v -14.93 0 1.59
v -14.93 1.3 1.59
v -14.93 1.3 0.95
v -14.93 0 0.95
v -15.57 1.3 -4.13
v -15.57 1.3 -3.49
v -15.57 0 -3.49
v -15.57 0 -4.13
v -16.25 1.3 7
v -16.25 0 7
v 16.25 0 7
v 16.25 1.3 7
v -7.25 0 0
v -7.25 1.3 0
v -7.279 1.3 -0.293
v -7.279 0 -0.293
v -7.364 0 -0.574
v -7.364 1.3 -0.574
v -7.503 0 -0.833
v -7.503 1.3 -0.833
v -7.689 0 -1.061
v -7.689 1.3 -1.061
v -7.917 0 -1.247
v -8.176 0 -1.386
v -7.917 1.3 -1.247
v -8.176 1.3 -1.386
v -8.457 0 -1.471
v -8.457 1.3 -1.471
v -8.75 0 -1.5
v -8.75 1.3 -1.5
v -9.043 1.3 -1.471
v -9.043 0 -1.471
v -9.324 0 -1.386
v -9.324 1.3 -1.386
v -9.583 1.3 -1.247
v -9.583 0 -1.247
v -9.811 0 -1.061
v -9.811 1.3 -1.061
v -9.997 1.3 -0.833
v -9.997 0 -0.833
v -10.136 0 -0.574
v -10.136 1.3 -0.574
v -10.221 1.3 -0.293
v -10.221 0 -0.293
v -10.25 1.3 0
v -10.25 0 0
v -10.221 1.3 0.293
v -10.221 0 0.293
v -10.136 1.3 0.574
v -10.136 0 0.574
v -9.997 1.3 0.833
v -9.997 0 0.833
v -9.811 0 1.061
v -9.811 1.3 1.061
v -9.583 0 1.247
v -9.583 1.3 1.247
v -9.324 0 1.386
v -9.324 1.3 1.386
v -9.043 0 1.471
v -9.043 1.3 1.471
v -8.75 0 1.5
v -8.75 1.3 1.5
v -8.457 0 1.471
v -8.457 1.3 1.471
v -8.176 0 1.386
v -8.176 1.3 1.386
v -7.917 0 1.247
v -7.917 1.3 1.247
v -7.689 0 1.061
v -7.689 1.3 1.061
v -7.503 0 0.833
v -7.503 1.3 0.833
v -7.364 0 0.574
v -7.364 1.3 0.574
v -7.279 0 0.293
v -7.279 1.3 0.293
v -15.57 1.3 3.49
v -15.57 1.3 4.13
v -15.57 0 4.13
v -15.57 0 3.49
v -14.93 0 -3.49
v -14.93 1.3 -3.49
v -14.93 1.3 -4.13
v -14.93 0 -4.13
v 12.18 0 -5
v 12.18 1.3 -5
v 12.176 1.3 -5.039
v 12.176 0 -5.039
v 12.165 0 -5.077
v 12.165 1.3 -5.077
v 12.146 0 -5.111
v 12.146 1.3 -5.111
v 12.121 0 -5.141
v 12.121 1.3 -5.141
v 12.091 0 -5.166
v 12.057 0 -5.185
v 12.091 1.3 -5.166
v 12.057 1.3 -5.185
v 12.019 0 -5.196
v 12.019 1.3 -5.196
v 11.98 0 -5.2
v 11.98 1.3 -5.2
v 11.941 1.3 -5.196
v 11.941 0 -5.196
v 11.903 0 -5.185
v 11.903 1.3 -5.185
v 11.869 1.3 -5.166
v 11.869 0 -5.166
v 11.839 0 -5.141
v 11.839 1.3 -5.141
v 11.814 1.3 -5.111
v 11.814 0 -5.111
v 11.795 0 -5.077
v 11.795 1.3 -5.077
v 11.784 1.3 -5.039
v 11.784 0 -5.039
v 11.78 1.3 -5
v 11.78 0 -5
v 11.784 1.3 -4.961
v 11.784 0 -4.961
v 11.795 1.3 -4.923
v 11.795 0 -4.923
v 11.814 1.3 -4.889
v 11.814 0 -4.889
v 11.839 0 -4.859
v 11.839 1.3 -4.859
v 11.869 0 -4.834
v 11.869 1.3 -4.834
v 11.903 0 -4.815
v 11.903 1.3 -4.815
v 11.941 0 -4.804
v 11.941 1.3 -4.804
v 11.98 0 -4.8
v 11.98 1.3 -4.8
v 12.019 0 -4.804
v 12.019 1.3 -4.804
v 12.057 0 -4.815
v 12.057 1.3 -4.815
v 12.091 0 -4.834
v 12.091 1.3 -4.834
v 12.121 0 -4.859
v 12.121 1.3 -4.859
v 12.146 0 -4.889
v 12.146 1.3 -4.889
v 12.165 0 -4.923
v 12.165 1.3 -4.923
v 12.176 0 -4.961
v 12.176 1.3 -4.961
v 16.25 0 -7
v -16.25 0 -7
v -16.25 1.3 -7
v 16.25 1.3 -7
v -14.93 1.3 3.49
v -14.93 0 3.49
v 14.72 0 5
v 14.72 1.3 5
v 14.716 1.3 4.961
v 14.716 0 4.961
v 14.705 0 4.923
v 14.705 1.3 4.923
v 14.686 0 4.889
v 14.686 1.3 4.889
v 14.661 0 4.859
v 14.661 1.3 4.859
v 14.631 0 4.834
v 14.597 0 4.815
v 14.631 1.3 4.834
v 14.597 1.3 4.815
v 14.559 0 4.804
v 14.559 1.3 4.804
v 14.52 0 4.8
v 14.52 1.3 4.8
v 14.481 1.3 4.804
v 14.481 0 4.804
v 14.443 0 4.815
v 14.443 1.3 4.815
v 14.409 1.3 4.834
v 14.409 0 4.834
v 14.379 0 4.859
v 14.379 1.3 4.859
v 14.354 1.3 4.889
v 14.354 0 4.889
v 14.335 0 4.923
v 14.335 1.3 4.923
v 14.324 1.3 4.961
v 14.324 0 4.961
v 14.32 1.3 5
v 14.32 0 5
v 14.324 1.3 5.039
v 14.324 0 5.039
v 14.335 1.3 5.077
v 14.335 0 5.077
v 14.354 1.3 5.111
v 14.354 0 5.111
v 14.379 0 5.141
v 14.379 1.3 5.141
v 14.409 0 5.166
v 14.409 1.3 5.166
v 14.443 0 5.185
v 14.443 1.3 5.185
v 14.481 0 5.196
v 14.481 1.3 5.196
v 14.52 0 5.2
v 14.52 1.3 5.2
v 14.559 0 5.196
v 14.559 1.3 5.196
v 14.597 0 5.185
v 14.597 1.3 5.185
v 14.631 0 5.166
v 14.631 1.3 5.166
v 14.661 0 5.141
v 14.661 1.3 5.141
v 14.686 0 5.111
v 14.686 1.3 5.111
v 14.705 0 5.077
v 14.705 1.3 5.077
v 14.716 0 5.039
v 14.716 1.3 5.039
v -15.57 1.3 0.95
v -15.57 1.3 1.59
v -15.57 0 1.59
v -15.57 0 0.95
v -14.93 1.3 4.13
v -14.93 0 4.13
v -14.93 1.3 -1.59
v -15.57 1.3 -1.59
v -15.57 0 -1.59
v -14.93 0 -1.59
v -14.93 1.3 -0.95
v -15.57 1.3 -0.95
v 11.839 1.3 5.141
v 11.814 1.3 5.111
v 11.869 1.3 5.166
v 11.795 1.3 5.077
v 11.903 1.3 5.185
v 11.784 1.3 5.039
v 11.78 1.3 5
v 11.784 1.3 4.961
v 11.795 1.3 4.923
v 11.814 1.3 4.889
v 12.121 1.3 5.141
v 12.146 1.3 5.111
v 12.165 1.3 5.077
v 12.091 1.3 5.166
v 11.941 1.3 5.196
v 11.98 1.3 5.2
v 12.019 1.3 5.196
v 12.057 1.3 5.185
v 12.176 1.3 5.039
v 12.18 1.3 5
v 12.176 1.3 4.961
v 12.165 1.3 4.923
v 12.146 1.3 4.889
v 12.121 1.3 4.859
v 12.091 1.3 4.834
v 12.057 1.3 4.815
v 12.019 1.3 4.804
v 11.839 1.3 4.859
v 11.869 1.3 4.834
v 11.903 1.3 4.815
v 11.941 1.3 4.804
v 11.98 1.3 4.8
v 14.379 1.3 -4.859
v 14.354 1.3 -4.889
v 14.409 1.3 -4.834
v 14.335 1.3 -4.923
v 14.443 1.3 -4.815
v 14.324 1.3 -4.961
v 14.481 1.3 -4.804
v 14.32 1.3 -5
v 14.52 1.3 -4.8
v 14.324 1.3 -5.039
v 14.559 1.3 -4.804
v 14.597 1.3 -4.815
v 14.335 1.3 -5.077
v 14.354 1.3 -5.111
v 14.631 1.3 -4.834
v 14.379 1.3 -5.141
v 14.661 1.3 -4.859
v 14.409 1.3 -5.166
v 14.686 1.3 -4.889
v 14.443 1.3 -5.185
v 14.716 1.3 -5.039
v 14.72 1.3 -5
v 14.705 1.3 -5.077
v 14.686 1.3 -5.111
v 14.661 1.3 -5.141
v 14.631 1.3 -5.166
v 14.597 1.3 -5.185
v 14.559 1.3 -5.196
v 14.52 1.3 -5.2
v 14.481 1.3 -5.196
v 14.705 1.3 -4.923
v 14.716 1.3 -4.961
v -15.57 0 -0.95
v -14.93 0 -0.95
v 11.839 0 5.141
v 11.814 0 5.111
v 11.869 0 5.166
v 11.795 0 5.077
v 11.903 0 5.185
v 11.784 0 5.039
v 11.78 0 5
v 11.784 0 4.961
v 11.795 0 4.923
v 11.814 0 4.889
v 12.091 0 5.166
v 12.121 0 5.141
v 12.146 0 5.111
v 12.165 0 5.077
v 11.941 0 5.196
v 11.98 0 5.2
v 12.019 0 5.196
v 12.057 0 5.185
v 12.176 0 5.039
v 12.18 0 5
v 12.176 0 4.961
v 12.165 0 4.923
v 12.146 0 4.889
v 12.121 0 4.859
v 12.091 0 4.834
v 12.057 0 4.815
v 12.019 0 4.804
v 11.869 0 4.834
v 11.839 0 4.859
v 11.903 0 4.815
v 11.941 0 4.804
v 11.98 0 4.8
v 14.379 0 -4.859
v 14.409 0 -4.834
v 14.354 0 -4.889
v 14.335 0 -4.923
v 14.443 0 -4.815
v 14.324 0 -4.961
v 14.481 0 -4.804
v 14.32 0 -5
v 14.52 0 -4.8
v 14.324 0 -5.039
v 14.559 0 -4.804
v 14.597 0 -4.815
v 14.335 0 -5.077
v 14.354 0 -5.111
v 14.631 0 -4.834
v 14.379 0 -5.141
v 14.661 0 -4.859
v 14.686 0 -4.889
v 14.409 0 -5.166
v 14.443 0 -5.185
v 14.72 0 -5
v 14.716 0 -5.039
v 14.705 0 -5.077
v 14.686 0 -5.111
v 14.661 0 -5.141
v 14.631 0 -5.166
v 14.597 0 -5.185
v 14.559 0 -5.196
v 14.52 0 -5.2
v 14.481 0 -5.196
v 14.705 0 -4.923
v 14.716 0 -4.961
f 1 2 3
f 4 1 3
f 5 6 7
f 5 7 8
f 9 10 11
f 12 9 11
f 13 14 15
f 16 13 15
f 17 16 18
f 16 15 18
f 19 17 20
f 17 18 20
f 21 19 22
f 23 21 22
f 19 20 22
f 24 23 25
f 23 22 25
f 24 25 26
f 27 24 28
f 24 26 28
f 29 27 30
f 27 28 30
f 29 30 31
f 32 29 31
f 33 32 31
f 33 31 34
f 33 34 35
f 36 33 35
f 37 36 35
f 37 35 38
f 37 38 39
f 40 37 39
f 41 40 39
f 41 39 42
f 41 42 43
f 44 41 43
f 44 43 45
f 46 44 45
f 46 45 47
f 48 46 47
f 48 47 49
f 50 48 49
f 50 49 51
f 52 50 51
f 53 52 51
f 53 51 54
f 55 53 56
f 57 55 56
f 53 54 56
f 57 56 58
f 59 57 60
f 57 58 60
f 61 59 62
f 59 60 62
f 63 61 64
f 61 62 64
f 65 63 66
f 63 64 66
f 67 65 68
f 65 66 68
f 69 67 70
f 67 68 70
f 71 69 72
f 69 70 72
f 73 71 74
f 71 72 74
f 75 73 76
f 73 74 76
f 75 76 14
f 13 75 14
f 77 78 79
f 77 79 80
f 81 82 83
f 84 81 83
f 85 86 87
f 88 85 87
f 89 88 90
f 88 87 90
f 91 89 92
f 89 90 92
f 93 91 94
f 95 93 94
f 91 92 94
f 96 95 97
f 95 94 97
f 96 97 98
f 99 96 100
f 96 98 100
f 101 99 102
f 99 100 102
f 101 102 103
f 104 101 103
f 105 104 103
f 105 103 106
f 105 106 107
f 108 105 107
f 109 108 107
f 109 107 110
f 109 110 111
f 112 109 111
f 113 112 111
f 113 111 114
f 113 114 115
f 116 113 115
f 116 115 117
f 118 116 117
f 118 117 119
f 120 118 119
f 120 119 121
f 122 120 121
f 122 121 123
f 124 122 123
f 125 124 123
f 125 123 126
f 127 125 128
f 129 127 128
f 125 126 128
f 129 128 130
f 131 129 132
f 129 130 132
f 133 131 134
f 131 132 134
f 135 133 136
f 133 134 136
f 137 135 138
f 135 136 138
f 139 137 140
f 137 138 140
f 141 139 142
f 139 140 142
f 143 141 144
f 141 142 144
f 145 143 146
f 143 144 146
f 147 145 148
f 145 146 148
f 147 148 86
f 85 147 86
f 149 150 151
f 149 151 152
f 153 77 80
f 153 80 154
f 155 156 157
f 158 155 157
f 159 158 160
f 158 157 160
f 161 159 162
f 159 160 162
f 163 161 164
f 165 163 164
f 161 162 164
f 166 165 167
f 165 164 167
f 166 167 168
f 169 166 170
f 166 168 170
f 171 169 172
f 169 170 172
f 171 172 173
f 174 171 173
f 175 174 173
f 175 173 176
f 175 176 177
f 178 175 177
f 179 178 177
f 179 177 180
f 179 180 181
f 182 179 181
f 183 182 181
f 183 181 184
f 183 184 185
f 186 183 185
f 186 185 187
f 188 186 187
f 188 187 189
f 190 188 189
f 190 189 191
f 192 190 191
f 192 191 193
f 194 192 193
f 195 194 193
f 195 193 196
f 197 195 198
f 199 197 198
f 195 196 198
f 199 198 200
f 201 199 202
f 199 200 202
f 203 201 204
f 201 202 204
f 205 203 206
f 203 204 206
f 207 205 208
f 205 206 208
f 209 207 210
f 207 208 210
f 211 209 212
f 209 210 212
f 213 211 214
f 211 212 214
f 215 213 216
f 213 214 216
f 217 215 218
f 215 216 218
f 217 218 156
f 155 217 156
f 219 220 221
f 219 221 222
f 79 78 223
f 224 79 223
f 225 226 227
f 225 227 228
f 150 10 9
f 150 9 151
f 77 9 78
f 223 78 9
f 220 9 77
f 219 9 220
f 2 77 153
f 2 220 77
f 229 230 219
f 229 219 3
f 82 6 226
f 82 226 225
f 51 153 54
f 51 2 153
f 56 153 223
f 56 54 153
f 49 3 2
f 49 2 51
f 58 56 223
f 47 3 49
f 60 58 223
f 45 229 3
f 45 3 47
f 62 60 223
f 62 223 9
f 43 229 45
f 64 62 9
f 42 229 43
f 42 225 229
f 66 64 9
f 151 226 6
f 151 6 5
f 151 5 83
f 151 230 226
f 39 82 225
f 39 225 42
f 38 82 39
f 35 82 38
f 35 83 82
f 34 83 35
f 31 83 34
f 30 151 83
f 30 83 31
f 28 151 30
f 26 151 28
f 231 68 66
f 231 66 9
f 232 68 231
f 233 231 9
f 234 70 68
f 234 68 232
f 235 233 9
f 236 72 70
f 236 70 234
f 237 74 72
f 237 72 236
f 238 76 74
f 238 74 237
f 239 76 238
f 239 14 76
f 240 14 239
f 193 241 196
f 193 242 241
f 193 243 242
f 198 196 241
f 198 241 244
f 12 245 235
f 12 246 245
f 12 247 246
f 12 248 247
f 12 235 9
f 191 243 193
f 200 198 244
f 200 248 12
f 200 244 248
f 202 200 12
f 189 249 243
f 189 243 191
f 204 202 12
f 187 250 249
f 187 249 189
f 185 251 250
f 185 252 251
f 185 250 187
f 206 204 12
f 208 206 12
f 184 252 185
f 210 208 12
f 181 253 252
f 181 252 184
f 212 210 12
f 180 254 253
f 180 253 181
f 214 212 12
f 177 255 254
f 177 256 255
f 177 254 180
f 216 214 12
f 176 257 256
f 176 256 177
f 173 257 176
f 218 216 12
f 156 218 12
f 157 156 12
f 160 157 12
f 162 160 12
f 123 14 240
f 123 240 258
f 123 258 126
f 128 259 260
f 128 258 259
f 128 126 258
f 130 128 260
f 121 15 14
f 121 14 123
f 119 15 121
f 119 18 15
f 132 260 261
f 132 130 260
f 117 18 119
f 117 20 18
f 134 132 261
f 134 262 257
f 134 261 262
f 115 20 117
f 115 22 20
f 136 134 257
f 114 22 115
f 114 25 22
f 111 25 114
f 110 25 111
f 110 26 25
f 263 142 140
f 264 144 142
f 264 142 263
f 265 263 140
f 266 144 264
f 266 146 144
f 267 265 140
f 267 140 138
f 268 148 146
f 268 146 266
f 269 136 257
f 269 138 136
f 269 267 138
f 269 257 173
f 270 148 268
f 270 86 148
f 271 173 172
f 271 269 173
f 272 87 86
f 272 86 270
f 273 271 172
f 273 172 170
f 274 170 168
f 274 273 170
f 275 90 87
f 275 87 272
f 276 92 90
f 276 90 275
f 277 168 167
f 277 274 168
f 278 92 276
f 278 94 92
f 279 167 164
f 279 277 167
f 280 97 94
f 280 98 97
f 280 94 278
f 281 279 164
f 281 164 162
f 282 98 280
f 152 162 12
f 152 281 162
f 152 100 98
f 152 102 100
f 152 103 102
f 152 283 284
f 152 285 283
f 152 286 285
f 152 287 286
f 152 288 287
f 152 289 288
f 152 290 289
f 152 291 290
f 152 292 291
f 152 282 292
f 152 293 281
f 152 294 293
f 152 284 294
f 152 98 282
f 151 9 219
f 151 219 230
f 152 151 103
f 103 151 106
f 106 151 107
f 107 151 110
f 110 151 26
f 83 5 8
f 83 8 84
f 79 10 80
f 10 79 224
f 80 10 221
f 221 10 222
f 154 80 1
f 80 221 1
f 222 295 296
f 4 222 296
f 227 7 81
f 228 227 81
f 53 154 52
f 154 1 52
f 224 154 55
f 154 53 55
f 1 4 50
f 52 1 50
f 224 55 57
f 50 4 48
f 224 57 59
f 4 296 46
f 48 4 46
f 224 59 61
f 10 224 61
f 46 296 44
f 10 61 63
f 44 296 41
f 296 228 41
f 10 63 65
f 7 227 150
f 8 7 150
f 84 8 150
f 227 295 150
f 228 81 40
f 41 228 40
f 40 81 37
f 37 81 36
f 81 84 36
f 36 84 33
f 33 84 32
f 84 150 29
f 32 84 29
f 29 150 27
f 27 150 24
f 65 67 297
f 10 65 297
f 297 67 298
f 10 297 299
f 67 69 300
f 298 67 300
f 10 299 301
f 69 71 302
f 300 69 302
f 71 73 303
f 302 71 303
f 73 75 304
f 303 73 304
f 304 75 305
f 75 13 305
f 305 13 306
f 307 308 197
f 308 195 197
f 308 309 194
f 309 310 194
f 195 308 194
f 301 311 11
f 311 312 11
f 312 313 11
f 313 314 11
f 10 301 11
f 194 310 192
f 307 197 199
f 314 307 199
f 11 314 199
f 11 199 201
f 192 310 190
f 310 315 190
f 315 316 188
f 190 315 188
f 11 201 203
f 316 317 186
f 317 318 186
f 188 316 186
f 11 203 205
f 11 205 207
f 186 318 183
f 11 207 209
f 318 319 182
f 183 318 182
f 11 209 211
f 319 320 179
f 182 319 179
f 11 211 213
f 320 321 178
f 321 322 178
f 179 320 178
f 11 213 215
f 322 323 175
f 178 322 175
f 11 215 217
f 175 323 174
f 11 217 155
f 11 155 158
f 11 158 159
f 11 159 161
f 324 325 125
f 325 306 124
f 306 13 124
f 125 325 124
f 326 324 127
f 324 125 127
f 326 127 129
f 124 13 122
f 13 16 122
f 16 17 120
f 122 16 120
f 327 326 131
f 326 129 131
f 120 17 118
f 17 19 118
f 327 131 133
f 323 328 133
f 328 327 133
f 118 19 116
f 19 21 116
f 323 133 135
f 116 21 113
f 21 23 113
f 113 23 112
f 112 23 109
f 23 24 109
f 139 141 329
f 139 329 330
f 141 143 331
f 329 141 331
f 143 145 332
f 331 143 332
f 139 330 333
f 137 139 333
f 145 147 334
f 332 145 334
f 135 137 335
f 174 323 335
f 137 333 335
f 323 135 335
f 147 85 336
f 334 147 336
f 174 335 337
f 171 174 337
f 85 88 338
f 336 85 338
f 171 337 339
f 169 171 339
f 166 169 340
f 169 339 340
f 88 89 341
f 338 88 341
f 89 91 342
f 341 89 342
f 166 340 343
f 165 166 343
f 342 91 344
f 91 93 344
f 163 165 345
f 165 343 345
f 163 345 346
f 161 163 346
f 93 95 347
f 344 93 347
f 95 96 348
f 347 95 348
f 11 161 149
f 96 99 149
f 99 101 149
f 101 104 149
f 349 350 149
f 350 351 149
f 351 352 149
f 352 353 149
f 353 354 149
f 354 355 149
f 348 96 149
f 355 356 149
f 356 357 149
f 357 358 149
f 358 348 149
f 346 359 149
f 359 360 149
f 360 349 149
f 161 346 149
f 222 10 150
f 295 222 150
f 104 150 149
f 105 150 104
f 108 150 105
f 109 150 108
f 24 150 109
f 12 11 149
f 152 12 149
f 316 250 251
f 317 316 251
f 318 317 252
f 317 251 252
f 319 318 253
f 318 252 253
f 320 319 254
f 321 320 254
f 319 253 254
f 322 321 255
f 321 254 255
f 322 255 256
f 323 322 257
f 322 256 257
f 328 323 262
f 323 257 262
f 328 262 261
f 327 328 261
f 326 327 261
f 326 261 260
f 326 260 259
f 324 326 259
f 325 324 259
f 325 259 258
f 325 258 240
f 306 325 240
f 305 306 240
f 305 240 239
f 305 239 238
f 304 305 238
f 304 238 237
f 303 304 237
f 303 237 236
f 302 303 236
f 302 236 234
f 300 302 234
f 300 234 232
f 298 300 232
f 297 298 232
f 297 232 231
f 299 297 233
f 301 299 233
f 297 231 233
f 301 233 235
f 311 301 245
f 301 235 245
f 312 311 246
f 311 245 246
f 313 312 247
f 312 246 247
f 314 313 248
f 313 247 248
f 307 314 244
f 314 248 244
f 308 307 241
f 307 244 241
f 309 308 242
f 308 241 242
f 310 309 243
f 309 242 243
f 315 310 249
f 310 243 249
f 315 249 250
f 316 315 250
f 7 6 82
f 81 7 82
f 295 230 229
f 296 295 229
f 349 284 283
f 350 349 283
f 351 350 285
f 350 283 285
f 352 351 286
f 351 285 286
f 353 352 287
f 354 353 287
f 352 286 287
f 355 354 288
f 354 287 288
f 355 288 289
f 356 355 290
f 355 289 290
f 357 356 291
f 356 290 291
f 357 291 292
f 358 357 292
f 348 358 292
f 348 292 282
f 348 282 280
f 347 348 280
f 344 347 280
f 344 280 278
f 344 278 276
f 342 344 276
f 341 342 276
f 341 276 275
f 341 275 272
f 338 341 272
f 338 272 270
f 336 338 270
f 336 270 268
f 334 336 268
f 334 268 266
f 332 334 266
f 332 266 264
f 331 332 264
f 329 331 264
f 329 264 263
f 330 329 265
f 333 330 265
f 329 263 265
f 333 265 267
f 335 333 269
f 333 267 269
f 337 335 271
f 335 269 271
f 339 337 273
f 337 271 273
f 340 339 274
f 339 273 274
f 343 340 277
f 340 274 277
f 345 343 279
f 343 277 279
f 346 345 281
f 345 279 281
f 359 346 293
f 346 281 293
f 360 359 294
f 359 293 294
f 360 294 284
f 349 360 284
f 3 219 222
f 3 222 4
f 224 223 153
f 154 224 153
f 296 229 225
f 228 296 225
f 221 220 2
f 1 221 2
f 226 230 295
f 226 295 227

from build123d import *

# Parameters (mm, degrees)
SKETCH1_W           = 32.5
SKETCH1_H           = 14
BOSS_EXTRUDE1_DEPTH = 1.3
SKETCH2_R           = 0.2
SKETCH2_W           = 0.64
SKETCH2_H           = 0.64
CUT_EXTRUDE1_DEPTH  = 2.3
SKETCH3_R           = 1.5
CUT_EXTRUDE2_DEPTH  = 10


with BuildPart() as part:
    # Sketch1 → Boss-Extrude1 (new body)
    with BuildSketch(Plane(origin=(0, 0, 0), x_dir=(1, 0, 0), z_dir=(0, 1, 0))):
        Rectangle(SKETCH1_W, SKETCH1_H)
    extrude(amount=BOSS_EXTRUDE1_DEPTH)

    # Sketch2 → Cut-Extrude1 (cut, through all)
    with BuildSketch(Plane(origin=(0, 1.3, 0), x_dir=(1, 0, 0), z_dir=(0, 1, 0))):
        with Locations((14.52, -5)):
            Circle(SKETCH2_R)
        with Locations((11.98, -5)):
            Circle(SKETCH2_R)
        with Locations((11.98, 5)):
            Circle(SKETCH2_R)
        with Locations((14.52, 5)):
            Circle(SKETCH2_R)
        with Locations((-15.25, 3.81)):
            Rectangle(SKETCH2_W, SKETCH2_H)
        with Locations((-15.25, 1.27)):
            Rectangle(SKETCH2_W, SKETCH2_H)
        with Locations((-15.25, -1.27)):
            Rectangle(SKETCH2_W, SKETCH2_H)
        with Locations((-15.25, -3.81)):
            Rectangle(SKETCH2_W, SKETCH2_H)
    extrude(amount=-CUT_EXTRUDE1_DEPTH, mode=Mode.SUBTRACT)

    # Sketch3 → Cut-Extrude2 (cut)
    with BuildSketch(Plane(origin=(0, 1.3, 0), x_dir=(1, 0, 0), z_dir=(0, 1, 0))):
        with Locations((-8.75, 0)):
            Circle(SKETCH3_R)
    extrude(amount=-CUT_EXTRUDE2_DEPTH, mode=Mode.SUBTRACT)


solid = part.part
